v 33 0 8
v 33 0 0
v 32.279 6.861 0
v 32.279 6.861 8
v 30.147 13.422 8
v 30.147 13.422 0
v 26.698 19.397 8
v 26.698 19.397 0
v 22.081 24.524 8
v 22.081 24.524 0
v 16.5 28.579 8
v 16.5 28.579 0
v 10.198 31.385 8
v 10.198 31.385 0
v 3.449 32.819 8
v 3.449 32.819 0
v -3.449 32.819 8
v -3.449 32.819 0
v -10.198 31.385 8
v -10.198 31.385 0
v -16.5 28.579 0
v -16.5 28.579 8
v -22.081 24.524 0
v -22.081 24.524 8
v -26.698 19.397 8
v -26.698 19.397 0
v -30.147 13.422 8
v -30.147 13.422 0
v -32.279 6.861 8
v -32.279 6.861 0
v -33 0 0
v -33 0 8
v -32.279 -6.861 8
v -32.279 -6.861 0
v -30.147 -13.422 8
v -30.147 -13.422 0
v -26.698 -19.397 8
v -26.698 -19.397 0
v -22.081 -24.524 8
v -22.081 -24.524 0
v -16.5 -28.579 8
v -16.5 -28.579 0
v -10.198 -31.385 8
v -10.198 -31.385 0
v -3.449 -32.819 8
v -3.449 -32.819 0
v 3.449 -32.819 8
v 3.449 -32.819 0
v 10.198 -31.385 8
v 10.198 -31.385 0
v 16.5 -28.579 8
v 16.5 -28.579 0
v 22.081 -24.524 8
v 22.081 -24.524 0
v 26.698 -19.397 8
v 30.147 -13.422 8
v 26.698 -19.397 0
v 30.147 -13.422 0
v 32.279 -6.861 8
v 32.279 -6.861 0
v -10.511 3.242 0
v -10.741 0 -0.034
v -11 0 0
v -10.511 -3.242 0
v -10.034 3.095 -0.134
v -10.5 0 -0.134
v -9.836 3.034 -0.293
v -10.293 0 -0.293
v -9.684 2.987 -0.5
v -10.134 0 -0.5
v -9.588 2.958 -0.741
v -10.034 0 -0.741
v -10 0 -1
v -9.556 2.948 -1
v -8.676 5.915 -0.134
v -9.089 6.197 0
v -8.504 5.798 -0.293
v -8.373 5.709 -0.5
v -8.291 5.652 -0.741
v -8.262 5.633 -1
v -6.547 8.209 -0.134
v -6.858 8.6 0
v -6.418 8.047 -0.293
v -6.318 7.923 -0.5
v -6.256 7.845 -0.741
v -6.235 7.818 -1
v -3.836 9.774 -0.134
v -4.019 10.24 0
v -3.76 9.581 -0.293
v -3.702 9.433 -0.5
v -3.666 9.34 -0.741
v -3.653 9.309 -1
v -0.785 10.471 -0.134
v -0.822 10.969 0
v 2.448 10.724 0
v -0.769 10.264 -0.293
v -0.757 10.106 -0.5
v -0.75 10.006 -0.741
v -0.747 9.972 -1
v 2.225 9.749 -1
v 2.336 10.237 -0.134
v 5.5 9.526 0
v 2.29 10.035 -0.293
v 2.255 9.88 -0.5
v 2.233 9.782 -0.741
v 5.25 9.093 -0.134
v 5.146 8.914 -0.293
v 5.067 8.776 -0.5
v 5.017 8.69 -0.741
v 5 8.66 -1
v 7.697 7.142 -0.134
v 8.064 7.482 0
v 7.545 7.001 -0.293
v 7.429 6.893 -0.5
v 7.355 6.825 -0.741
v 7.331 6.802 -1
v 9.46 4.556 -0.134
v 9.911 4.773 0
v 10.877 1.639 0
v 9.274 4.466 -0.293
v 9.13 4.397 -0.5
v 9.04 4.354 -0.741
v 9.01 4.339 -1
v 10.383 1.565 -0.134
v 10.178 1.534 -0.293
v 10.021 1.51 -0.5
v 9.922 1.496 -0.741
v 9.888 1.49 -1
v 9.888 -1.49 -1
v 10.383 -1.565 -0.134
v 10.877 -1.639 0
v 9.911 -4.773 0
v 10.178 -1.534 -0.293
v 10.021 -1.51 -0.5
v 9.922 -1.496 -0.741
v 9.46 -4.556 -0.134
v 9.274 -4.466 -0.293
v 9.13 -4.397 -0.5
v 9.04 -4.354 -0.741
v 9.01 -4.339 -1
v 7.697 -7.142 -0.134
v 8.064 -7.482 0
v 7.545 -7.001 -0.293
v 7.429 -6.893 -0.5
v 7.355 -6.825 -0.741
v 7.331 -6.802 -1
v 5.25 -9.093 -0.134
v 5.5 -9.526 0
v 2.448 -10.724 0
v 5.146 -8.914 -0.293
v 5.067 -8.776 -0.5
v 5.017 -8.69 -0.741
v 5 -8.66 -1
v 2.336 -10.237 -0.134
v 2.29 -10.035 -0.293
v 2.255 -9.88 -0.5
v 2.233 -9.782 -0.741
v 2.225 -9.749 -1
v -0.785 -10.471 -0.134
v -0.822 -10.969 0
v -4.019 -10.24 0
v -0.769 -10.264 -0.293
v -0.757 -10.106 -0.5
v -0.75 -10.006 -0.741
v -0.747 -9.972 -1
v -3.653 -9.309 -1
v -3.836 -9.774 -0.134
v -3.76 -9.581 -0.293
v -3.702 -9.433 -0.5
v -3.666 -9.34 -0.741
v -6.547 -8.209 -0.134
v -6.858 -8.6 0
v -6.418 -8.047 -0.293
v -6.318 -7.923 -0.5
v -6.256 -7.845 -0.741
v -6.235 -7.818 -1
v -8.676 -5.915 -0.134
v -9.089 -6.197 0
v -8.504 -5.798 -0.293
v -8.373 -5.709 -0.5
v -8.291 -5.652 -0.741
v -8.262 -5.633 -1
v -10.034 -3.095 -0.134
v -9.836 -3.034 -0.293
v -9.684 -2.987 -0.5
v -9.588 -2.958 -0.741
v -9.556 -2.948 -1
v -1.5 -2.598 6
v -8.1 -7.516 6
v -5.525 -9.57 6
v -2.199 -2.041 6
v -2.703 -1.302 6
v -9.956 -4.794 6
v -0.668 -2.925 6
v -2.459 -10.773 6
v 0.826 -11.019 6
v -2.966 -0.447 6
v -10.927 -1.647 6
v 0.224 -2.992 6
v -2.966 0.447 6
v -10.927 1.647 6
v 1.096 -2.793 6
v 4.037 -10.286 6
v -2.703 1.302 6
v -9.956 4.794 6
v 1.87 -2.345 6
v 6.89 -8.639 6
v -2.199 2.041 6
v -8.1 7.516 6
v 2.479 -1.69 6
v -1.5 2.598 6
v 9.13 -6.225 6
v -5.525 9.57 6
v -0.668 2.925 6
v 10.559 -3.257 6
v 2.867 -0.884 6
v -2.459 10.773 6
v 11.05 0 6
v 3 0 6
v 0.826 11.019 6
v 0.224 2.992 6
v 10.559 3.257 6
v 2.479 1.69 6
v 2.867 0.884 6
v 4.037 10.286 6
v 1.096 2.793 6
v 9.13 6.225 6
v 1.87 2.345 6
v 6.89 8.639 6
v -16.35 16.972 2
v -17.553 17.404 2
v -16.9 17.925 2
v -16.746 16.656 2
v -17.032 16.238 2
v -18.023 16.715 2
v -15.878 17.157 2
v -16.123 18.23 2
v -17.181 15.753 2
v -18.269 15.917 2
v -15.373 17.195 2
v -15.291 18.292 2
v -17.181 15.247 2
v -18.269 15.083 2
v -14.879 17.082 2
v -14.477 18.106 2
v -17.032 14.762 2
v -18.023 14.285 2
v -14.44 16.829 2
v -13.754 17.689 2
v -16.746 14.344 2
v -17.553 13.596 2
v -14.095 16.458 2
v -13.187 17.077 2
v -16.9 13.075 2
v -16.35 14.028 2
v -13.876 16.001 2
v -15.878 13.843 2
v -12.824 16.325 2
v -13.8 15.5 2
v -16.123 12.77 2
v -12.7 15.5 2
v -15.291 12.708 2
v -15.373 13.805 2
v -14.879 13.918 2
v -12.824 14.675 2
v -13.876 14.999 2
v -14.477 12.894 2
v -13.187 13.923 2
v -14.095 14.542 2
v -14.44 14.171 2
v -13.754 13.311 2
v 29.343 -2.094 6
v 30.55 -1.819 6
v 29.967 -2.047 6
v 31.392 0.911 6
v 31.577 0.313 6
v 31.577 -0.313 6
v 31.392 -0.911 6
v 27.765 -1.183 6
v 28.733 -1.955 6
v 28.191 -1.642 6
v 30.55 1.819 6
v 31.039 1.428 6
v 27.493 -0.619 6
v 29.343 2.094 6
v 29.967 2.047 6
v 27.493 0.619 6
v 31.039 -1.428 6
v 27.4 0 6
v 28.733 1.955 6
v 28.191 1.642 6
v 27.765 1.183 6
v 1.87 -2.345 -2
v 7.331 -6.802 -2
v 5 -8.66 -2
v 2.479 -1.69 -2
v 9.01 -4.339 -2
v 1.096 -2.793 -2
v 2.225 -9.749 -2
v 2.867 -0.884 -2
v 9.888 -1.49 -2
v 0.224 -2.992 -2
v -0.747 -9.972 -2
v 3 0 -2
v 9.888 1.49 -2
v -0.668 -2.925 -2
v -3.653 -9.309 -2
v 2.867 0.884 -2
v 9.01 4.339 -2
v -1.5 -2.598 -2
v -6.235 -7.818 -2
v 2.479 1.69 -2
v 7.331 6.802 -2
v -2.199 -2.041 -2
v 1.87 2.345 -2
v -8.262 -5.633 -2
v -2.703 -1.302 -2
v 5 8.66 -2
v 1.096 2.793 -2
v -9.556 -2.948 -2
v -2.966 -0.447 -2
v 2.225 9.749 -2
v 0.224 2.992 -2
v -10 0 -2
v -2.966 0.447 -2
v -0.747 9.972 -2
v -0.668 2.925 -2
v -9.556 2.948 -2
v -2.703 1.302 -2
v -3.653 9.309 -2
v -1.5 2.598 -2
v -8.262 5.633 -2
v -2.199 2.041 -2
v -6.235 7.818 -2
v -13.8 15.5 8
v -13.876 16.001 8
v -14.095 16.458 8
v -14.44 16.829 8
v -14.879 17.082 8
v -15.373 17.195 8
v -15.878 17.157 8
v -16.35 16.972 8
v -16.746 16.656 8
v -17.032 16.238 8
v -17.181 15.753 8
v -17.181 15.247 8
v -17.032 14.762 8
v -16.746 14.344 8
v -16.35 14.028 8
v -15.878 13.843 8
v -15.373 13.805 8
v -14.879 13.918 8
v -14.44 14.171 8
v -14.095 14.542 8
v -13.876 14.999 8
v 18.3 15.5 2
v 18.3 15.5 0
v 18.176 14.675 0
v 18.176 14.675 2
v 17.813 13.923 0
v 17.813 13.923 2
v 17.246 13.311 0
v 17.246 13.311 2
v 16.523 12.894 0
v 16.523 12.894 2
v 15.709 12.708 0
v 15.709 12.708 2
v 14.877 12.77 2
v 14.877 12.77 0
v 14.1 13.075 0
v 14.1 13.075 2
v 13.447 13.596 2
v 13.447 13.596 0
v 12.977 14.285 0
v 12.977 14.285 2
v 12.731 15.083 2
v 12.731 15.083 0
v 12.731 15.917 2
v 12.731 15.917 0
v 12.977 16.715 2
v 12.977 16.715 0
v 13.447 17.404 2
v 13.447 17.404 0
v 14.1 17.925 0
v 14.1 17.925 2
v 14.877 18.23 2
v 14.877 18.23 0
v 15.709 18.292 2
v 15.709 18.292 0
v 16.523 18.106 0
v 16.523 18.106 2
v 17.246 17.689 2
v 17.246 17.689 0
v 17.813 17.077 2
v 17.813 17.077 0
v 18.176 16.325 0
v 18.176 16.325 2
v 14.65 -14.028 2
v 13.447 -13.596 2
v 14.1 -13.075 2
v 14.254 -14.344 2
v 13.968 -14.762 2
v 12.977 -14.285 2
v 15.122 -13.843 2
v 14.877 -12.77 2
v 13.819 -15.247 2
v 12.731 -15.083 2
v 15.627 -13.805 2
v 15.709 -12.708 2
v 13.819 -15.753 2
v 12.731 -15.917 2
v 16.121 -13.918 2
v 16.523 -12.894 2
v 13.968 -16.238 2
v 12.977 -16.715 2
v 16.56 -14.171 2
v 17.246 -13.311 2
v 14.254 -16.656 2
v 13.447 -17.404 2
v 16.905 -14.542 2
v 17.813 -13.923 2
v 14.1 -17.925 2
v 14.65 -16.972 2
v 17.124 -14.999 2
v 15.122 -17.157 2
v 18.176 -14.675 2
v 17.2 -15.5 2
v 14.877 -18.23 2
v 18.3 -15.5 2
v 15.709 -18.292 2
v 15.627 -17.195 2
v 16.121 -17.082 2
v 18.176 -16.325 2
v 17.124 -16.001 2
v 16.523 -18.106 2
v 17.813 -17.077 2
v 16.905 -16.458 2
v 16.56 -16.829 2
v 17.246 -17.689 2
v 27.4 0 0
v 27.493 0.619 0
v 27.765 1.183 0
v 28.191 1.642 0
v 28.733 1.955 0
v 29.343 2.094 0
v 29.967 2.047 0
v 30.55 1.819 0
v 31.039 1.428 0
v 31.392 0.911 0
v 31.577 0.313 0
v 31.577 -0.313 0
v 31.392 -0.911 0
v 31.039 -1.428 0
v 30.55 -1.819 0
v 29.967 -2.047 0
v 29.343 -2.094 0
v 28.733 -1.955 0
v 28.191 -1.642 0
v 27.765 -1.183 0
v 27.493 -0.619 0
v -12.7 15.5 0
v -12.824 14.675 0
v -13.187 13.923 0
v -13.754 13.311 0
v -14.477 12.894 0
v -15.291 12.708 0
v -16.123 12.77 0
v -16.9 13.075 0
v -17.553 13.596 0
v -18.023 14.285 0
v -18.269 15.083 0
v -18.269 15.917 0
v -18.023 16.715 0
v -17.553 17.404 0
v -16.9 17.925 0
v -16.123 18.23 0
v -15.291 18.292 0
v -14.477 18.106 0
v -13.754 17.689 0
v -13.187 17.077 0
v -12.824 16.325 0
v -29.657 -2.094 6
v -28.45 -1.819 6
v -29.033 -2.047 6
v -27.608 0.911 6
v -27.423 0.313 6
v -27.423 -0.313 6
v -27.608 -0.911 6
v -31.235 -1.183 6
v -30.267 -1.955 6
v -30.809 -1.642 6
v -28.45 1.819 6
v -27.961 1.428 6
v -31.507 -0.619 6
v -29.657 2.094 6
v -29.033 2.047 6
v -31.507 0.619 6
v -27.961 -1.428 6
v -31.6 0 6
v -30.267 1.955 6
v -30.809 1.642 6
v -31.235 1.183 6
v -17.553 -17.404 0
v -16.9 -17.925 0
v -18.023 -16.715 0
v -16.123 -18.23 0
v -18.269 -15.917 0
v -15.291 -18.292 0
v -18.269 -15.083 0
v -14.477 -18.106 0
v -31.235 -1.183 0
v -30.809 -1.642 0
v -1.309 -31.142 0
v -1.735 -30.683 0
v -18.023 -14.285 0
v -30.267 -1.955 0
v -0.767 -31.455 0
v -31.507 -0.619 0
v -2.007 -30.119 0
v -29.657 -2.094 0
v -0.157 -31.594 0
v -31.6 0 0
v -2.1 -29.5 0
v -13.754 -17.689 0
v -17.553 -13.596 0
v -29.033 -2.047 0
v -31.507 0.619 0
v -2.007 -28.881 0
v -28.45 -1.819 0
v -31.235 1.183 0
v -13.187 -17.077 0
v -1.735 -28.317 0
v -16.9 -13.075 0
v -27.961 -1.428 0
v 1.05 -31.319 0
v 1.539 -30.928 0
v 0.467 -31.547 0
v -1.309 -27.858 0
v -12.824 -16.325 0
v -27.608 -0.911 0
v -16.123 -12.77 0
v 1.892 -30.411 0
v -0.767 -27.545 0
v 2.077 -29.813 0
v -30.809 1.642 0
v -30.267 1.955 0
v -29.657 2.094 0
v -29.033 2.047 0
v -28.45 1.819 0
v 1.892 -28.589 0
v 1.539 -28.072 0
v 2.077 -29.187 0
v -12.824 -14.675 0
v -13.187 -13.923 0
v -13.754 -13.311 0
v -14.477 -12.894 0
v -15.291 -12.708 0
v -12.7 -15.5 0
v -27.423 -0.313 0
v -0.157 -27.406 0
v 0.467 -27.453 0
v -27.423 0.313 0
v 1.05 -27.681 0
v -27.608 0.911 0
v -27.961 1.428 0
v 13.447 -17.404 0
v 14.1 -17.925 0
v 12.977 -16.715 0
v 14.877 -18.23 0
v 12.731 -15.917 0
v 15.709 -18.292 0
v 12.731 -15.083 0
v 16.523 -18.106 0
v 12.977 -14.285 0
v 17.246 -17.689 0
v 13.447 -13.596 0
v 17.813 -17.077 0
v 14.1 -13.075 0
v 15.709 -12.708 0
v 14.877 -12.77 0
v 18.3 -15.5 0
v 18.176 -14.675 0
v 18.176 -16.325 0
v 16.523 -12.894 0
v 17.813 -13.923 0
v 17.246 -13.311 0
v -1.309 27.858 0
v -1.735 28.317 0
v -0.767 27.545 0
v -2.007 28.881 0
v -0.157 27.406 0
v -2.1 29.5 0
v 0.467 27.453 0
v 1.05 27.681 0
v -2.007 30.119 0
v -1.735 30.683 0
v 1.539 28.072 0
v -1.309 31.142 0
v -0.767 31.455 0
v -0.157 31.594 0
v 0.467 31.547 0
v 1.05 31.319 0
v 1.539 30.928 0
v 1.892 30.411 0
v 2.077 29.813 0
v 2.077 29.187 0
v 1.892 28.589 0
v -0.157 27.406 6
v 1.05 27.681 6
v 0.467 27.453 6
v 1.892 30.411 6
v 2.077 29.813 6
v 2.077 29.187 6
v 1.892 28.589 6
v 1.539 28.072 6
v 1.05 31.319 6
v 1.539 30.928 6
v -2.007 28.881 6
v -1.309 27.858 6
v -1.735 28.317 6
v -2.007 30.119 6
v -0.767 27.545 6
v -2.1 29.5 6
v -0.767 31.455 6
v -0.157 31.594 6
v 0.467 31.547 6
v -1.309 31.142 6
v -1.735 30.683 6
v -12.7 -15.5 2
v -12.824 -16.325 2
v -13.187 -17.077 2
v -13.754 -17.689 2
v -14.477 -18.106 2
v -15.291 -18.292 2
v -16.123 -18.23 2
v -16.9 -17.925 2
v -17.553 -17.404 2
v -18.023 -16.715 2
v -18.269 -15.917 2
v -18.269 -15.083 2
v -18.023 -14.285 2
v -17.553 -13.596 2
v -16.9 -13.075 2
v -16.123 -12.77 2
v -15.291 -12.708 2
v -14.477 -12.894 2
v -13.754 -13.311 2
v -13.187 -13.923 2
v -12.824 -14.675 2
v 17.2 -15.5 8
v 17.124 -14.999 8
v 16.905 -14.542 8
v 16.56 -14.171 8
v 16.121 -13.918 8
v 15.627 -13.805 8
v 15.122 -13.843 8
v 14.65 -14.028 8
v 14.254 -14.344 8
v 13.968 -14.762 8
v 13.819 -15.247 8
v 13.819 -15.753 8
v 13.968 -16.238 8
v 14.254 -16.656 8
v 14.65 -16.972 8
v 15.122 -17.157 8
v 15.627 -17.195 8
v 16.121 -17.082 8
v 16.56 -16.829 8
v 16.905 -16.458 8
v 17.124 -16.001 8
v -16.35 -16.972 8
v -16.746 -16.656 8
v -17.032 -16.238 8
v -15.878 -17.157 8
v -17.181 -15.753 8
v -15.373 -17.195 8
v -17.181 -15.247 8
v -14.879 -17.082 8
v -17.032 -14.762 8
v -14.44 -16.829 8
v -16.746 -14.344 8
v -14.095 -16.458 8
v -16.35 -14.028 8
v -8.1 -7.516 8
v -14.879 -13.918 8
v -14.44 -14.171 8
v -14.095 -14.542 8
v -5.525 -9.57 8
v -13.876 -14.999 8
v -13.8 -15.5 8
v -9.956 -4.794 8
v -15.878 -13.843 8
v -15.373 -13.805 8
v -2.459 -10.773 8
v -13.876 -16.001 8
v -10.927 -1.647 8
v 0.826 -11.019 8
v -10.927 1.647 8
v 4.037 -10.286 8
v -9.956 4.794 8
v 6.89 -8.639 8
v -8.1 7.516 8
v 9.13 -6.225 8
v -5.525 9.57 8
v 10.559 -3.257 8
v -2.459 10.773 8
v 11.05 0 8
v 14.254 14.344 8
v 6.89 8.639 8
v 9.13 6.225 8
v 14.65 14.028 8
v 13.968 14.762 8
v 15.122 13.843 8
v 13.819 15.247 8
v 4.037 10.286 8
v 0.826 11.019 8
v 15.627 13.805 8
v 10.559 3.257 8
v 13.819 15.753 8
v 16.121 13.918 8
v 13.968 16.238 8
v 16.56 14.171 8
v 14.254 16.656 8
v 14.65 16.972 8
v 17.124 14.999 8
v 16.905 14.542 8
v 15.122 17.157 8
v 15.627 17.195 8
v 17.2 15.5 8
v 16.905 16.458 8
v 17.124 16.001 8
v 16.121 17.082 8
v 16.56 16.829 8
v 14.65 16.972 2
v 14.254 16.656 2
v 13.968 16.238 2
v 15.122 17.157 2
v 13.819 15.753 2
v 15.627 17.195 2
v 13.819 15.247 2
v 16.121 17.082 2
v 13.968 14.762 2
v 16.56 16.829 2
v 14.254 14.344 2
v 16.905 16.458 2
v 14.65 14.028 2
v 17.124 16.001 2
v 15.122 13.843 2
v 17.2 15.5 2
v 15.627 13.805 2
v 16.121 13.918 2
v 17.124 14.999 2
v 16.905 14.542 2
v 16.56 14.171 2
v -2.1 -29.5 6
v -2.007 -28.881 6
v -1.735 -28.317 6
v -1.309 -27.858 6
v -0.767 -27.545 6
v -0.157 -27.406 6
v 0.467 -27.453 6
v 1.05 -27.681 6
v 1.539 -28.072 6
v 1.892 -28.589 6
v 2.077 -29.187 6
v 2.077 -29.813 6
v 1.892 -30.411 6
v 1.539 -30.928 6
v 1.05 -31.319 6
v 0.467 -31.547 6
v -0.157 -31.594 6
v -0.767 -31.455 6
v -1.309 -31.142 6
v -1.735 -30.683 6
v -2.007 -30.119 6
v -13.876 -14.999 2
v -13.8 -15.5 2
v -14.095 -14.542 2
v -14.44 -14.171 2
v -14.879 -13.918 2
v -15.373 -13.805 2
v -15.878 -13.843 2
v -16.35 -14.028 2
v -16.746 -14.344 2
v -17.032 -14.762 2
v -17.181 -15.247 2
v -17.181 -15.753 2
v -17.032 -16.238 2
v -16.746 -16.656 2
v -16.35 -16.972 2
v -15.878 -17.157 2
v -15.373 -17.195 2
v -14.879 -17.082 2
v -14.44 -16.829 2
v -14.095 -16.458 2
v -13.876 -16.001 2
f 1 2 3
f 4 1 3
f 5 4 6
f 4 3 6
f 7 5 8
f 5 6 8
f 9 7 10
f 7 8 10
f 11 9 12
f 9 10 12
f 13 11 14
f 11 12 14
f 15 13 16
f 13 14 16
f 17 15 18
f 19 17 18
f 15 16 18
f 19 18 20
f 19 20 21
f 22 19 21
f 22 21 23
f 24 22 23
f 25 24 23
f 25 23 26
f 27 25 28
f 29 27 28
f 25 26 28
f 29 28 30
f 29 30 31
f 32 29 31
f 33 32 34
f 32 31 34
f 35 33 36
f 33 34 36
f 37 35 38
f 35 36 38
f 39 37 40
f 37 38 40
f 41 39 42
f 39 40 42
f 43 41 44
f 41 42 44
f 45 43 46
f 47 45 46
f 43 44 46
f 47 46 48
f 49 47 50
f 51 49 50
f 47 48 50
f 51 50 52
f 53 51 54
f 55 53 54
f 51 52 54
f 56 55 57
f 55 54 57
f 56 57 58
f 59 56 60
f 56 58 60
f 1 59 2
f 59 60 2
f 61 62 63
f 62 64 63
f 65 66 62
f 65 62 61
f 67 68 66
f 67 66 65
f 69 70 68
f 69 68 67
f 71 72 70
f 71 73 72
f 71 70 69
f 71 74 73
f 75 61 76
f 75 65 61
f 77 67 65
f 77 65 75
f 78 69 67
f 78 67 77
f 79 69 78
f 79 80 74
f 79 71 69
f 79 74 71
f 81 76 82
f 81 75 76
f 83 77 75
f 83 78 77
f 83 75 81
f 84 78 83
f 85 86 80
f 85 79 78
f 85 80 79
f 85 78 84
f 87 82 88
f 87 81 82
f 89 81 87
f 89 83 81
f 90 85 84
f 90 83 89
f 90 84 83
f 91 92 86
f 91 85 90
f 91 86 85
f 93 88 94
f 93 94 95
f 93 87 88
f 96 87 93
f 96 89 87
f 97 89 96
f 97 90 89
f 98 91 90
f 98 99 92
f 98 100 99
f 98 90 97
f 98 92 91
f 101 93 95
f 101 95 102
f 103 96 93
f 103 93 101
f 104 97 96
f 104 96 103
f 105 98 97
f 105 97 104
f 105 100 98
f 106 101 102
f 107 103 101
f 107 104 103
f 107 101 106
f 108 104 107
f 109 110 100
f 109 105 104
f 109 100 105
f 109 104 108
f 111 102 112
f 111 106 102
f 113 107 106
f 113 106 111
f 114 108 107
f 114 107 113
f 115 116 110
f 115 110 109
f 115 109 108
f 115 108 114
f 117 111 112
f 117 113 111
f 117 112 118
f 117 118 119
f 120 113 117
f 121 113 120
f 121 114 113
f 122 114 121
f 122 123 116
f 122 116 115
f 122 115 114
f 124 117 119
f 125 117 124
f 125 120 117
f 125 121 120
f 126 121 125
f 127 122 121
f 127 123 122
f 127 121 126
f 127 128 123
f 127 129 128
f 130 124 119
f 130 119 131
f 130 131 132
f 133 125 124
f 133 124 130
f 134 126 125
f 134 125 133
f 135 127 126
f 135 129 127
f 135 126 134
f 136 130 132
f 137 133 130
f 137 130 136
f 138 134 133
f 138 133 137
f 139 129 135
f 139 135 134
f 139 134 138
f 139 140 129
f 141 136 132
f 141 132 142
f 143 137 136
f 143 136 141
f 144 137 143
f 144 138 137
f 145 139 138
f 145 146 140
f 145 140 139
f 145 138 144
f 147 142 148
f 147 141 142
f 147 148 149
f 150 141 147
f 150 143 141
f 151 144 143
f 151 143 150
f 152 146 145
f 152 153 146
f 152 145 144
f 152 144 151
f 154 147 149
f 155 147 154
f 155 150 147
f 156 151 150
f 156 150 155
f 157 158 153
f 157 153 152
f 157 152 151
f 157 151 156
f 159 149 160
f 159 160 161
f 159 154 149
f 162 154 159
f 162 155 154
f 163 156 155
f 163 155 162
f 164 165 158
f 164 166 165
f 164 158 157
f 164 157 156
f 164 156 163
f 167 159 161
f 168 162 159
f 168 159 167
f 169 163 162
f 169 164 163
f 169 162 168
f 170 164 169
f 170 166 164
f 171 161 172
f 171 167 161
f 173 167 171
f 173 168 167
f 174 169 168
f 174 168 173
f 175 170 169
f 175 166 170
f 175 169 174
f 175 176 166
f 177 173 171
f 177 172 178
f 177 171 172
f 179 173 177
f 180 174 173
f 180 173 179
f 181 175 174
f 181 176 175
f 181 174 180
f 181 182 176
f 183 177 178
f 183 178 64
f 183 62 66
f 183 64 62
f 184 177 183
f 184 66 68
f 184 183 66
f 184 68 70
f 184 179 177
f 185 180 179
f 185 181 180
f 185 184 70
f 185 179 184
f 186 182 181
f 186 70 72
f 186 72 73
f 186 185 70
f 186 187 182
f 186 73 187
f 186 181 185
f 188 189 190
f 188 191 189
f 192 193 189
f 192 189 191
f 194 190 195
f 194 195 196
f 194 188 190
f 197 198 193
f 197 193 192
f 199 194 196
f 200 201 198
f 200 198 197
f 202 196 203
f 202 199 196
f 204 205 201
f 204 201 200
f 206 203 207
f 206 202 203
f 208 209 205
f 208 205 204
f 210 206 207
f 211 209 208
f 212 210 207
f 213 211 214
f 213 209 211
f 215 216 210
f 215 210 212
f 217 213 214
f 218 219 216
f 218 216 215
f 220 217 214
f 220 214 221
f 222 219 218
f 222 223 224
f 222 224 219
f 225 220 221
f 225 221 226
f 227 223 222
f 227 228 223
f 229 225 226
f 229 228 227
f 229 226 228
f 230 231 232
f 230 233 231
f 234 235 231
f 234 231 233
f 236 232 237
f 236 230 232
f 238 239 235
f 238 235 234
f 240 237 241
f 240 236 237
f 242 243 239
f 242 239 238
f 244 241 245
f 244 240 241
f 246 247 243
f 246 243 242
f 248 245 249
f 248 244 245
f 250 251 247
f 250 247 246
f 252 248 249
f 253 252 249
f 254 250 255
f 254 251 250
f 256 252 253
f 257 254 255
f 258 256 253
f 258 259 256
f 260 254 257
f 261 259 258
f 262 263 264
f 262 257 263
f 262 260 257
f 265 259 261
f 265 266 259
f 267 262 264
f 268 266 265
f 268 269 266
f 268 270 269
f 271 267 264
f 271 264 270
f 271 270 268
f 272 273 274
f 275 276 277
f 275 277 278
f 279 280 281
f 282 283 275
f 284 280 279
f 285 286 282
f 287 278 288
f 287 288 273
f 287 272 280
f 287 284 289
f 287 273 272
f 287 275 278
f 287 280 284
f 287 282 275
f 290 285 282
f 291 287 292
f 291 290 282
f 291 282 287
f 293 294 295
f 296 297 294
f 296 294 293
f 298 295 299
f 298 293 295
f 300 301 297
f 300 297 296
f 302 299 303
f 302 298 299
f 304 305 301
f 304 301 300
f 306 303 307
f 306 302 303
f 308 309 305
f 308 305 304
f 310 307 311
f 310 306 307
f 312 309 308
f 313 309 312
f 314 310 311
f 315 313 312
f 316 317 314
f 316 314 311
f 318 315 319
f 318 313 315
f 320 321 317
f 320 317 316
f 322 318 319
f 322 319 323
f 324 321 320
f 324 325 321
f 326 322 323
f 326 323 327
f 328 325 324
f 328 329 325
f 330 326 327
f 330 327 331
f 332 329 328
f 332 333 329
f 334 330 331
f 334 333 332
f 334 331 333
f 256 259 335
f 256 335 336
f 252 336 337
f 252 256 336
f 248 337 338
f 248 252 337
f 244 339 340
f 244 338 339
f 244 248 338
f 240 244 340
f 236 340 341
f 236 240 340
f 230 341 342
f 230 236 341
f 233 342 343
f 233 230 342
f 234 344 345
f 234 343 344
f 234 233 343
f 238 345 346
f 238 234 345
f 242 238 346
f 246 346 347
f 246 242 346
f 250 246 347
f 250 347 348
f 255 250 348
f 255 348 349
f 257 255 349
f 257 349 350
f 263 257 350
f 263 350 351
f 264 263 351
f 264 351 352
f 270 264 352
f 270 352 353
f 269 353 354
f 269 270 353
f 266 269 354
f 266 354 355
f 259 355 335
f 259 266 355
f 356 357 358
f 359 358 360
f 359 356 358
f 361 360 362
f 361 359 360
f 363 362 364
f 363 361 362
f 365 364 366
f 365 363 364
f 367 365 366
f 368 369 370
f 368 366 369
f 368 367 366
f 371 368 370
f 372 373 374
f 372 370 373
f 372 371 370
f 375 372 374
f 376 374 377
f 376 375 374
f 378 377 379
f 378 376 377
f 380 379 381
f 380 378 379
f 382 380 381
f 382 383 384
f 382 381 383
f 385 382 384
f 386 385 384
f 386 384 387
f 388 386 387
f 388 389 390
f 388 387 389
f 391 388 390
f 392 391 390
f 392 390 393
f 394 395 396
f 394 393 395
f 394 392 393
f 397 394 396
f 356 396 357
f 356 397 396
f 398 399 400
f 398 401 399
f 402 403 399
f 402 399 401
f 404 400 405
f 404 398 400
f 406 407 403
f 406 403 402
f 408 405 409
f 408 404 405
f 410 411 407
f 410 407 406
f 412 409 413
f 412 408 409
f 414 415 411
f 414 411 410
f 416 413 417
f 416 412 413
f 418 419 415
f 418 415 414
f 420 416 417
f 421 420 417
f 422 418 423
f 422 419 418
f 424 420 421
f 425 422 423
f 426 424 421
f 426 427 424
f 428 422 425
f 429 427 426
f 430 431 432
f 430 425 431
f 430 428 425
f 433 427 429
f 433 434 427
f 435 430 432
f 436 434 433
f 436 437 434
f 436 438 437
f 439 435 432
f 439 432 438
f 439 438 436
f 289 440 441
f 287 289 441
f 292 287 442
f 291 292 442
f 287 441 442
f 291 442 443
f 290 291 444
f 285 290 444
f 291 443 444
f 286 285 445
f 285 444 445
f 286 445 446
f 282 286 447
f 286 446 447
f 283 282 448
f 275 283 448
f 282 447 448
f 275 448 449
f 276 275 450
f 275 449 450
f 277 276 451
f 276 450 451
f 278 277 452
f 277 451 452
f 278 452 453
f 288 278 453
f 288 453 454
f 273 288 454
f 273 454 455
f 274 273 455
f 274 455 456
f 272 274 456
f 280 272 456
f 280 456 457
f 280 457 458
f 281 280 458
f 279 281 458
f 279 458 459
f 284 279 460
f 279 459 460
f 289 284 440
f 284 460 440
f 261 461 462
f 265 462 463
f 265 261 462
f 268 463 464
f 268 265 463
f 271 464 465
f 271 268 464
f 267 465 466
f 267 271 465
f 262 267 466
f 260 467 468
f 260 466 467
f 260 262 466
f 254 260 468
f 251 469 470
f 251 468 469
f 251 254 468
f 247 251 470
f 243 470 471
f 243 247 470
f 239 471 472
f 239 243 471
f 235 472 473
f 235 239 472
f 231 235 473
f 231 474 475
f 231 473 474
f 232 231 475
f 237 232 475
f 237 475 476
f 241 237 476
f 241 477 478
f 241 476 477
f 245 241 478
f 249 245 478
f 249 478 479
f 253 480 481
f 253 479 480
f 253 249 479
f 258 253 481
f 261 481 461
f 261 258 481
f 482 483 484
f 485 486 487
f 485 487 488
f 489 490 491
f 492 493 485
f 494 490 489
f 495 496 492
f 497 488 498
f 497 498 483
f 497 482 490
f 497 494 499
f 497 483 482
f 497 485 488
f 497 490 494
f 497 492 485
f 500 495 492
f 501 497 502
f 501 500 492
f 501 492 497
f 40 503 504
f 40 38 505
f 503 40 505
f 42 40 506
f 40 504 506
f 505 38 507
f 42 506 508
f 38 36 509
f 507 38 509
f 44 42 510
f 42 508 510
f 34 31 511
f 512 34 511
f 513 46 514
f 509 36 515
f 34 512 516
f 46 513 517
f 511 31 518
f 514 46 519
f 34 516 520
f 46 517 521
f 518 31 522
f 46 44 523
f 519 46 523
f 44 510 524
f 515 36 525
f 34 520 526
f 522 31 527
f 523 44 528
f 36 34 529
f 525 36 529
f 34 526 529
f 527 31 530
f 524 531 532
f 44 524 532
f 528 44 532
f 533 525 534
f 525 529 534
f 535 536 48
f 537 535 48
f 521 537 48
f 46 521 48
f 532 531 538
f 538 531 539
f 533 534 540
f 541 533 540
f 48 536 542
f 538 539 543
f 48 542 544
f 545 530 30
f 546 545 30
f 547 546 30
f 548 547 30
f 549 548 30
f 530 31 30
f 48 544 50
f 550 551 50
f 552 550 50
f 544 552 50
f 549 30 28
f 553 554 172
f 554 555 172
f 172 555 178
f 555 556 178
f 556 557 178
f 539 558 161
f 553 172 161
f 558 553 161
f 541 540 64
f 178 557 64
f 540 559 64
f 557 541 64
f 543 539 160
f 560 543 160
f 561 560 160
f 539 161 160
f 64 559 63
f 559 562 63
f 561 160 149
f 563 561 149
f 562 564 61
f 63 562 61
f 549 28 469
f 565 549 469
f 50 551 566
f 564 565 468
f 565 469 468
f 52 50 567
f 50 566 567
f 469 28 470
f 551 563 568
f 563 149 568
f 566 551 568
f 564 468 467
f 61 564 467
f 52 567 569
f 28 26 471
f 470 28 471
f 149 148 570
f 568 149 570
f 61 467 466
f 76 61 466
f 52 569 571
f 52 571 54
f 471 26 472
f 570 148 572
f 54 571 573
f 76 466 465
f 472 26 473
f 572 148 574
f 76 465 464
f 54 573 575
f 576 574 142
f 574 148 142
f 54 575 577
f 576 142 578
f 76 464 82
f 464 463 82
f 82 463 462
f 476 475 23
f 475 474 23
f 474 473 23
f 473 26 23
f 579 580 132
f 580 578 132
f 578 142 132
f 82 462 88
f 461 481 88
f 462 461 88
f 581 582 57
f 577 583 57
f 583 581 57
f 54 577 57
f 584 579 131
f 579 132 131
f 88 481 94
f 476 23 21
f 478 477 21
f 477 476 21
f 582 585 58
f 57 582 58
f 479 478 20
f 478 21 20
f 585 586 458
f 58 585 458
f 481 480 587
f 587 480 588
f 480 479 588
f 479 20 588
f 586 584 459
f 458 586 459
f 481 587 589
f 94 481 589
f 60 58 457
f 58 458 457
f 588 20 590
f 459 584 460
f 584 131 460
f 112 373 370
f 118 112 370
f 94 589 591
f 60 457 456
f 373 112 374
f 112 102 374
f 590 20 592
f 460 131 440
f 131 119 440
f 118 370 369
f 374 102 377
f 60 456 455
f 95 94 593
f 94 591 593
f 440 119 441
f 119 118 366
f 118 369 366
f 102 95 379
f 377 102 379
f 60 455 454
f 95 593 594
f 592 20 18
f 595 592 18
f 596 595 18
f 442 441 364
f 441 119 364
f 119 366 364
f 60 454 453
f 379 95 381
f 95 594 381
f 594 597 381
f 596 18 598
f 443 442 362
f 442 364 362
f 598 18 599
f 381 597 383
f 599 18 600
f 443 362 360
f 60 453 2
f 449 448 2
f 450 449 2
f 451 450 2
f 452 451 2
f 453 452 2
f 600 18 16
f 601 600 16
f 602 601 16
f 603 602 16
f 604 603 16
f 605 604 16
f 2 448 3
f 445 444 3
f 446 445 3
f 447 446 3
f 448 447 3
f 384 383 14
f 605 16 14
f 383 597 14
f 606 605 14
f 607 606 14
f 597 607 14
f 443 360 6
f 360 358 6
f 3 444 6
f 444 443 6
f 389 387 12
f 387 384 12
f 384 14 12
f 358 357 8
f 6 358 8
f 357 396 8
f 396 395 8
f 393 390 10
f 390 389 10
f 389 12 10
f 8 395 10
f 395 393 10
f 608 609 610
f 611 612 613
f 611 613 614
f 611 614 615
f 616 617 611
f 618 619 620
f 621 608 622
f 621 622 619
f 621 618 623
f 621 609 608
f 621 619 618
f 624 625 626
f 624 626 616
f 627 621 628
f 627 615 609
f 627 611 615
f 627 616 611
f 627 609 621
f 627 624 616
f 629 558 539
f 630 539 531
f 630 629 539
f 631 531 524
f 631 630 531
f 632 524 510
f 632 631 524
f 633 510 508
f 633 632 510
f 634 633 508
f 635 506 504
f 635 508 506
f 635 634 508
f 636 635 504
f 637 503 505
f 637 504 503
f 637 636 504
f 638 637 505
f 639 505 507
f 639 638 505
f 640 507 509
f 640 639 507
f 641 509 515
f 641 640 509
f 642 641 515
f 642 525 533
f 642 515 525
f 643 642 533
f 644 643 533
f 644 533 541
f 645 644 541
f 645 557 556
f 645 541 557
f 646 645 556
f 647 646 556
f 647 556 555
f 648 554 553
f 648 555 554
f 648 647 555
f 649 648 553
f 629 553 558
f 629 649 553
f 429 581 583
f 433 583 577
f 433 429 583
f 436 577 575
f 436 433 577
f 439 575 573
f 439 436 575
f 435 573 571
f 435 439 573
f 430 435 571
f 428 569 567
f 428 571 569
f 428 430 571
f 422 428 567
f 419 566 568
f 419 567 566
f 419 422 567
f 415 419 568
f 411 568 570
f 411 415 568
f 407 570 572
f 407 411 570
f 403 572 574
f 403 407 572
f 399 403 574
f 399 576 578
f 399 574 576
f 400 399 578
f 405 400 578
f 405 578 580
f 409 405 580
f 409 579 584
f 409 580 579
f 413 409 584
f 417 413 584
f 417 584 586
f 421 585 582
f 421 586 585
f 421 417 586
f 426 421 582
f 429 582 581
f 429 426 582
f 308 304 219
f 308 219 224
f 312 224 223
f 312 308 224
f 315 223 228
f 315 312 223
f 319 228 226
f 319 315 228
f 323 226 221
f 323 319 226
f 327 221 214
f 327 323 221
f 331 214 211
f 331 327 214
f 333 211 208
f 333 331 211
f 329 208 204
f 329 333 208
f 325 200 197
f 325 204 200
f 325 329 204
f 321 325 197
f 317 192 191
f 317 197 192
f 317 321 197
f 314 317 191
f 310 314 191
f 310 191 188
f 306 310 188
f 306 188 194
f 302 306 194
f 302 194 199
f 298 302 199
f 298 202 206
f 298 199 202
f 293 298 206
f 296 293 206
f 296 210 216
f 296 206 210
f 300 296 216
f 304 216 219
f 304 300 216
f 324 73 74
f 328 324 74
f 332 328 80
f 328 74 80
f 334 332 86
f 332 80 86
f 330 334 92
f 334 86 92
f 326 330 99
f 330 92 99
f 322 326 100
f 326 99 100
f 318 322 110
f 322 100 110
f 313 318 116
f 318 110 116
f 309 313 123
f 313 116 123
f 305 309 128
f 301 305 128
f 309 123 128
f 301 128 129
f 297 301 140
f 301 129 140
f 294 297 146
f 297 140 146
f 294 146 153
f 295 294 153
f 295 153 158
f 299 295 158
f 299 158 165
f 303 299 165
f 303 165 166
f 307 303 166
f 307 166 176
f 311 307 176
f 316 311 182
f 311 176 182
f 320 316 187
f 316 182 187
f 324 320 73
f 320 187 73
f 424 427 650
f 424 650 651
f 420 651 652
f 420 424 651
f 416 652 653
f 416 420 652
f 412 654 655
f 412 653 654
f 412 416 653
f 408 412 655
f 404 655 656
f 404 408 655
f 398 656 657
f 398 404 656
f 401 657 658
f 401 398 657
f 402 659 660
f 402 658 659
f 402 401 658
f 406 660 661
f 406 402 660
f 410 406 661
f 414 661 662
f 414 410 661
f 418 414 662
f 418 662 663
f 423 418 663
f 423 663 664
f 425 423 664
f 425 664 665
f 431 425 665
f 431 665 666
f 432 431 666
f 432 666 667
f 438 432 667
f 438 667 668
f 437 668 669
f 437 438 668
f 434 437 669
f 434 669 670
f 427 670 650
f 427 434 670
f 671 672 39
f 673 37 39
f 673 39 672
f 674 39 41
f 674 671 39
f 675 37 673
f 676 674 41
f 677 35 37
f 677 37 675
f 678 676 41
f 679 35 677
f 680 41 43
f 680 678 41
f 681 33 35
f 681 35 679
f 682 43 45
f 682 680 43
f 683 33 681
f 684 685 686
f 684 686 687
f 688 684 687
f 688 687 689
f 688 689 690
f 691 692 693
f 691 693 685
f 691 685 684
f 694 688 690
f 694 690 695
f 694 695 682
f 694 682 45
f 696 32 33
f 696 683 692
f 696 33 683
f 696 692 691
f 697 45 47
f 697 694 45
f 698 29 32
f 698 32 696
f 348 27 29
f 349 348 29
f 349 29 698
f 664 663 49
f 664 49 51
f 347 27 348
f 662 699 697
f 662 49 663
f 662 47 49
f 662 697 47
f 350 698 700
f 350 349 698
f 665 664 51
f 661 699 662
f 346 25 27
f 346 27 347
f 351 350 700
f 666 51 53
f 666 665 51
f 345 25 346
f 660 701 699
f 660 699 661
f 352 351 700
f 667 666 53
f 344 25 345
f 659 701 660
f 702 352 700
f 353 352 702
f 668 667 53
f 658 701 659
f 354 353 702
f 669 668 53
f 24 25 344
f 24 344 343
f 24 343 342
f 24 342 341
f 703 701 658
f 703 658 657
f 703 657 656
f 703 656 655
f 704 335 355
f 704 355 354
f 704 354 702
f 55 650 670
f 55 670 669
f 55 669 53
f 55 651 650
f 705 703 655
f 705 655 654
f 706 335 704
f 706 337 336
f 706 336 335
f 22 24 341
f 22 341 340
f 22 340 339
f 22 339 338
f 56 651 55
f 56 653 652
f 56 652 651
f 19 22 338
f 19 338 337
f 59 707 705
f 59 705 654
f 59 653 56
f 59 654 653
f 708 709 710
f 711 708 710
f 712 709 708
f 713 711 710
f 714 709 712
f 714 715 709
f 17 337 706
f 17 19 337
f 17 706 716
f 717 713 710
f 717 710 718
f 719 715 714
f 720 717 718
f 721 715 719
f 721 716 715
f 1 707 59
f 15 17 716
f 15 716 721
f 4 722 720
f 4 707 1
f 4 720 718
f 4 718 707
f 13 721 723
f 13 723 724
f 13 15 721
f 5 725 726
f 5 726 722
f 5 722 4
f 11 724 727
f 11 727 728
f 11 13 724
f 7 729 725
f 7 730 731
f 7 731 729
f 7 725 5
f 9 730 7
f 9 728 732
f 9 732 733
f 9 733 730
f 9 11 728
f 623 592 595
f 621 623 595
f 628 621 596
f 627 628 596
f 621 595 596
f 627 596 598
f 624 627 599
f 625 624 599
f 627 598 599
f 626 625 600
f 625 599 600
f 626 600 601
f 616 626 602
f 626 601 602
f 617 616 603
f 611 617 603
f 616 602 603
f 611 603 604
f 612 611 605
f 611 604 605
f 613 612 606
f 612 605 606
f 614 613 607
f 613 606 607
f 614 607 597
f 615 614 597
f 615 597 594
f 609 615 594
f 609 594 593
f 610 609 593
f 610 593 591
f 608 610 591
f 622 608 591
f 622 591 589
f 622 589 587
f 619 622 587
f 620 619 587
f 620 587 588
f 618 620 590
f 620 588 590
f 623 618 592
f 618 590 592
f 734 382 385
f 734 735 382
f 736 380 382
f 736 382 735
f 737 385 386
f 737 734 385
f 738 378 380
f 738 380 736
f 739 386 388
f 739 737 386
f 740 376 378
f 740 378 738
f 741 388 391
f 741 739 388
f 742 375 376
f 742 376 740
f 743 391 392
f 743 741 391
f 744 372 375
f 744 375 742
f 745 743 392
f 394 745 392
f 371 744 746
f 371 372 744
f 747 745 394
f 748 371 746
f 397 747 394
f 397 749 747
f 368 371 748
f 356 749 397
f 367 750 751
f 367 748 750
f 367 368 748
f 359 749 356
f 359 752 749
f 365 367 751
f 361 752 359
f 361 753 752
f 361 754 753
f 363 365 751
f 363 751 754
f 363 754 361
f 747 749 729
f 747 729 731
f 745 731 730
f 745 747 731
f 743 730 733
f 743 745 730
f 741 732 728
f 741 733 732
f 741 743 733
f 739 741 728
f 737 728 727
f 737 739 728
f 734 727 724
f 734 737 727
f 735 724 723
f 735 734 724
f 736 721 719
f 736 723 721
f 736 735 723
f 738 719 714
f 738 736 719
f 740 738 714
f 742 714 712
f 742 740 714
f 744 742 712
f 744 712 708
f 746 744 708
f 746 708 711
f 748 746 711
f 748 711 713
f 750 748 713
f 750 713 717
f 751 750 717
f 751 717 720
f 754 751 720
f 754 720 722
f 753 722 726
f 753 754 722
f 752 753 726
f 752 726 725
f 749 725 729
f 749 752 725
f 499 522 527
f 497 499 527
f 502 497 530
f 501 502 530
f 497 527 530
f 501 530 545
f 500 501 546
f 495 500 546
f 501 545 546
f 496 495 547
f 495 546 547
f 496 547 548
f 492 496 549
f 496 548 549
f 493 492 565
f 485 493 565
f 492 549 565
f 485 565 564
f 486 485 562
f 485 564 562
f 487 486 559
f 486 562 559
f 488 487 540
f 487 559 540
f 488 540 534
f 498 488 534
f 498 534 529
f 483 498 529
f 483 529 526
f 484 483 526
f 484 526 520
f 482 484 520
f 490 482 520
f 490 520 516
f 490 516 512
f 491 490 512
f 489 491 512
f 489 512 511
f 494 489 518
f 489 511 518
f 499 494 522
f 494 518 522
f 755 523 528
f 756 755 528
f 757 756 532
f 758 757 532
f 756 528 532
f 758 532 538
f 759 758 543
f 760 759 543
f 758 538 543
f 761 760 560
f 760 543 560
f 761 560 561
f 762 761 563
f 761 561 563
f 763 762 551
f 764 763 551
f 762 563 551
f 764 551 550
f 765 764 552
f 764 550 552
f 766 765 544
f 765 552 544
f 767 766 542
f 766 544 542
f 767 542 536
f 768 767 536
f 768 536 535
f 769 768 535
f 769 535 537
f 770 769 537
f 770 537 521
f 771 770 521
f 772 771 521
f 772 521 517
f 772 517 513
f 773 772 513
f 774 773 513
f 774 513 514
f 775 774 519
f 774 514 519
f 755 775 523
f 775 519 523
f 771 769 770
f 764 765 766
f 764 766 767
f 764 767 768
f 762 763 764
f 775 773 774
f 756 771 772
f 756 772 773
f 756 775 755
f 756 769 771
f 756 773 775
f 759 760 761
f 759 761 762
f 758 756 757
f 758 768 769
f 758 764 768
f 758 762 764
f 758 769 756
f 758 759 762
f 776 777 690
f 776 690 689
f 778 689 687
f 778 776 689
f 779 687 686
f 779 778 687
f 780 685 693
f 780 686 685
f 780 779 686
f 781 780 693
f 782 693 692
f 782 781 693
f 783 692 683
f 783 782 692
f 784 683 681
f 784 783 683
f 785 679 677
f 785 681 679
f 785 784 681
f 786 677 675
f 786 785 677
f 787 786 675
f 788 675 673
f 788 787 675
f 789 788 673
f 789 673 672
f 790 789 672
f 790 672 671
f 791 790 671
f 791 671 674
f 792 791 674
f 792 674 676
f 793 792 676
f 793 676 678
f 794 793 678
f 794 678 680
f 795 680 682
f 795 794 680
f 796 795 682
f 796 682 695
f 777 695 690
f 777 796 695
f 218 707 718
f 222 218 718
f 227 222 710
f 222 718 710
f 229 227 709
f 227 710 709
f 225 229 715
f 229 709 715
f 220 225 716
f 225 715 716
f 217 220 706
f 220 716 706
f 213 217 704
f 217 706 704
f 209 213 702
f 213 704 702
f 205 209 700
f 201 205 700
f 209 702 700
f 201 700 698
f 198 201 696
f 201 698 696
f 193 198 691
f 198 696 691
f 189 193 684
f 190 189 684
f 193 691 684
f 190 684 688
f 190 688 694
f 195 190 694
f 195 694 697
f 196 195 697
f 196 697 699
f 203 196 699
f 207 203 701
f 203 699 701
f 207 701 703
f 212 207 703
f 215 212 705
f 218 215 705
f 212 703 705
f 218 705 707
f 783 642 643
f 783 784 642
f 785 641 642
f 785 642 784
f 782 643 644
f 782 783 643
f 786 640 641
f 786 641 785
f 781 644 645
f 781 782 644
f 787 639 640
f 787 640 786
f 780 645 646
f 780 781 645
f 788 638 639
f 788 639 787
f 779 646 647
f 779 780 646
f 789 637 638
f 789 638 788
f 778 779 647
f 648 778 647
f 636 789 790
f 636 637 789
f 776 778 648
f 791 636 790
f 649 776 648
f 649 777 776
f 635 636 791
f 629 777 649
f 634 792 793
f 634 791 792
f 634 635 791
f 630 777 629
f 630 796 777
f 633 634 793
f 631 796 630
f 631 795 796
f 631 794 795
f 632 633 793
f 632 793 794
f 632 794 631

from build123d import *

# Parameters (mm, degrees)
SKETCH2_R               = 33
BOSS_EXTRUDE1_DEPTH     = 8
SKETCH6_R               = 10
BOSS_EXTRUDE2_DEPTH     = 2
CUT_EXTRUDE1_DEPTH      = 48.728398255
CUT_EXTRUDE1_DEPTH_BACK = 48.728398255
SKETCH3_R               = 1.7
SKETCH3_R_2             = 3
CUT_EXTRUDE2_DEPTH      = 48.349762407
CUT_EXTRUDE2_DEPTH_BACK = 2
SKETCH4_R               = 2.8
SKETCH5_R               = 2.1
CUT_EXTRUDE3_DEPTH      = 6
FILLET1_R               = 1
SKETCH7_R               = 11.05
CUT_EXTRUDE4_DEPTH      = 2


with BuildPart() as part:
    # Sketch2 → Boss-Extrude1 (new body)
    with BuildSketch(Plane.XY):
        Circle(SKETCH2_R)
    extrude(amount=BOSS_EXTRUDE1_DEPTH)

    # Sketch6 → Boss-Extrude2 (add)
    with BuildSketch(Plane(origin=(0, 0, 0), x_dir=(-1, 0, 0), z_dir=(0, 0, -1))):
        Circle(SKETCH6_R)
    extrude(amount=BOSS_EXTRUDE2_DEPTH)

    # Sketch3 → Cut-Extrude1 (cut, two sides: drawn at the far end of the back side and taken through both)
    with BuildSketch(Plane.XY.offset(8).offset(-CUT_EXTRUDE1_DEPTH_BACK)):
        with Locations((-15.5, 15.5)):
            Circle(SKETCH3_R)
        with Locations((15.5, 15.5)):
            Circle(SKETCH3_R)
        with Locations((15.5, -15.5)):
            Circle(SKETCH3_R)
        with Locations((-15.5, -15.5)):
            Circle(SKETCH3_R)
        Circle(SKETCH3_R_2)
    extrude(amount=CUT_EXTRUDE1_DEPTH + CUT_EXTRUDE1_DEPTH_BACK, mode=Mode.SUBTRACT)

    # Sketch4 → Cut-Extrude2 (cut, two sides: drawn at the far end of the back side and taken through both)
    with BuildSketch(Plane(origin=(0, 0, 0), x_dir=(-1, 0, 0), z_dir=(0, 0, -1)).offset(-CUT_EXTRUDE2_DEPTH_BACK)):
        with Locations(Location((-15.5, 15.5, 0), (0, 0, 180))):
            Circle(SKETCH4_R)
        with Locations(Location((15.5, 15.5, 0), (0, 0, 180))):
            Circle(SKETCH4_R)
        with Locations(Location((15.5, -15.5, 0), (0, 0, 180))):
            Circle(SKETCH4_R)
        with Locations(Location((-15.5, -15.5, 0), (0, 0, 180))):
            Circle(SKETCH4_R)
    extrude(amount=CUT_EXTRUDE2_DEPTH + CUT_EXTRUDE2_DEPTH_BACK, mode=Mode.SUBTRACT)

    # Sketch5 → Cut-Extrude3 (cut)
    with BuildSketch(Plane(origin=(0, 0, 0), x_dir=(-1, 0, 0), z_dir=(0, 0, -1))):
        with Locations((0, 29.5)):
            Circle(SKETCH5_R)
        with Locations((29.5, 0)):
            Circle(SKETCH5_R)
        with Locations((0, -29.5)):
            Circle(SKETCH5_R)
        with Locations((-29.5, 0)):
            Circle(SKETCH5_R)
    extrude(amount=-CUT_EXTRUDE3_DEPTH, mode=Mode.SUBTRACT)

    # Fillet1
    fillet1_edges = [part.edges().sort_by_distance(p)[0] for p in [
        (10, 0, 0),
    ]]
    fillet(fillet1_edges, radius=FILLET1_R)

    # Sketch7 → Cut-Extrude4 (cut)
    with BuildSketch(Plane.XY.offset(8)):
        Circle(SKETCH7_R)
    extrude(amount=-CUT_EXTRUDE4_DEPTH, mode=Mode.SUBTRACT)


solid = part.part
